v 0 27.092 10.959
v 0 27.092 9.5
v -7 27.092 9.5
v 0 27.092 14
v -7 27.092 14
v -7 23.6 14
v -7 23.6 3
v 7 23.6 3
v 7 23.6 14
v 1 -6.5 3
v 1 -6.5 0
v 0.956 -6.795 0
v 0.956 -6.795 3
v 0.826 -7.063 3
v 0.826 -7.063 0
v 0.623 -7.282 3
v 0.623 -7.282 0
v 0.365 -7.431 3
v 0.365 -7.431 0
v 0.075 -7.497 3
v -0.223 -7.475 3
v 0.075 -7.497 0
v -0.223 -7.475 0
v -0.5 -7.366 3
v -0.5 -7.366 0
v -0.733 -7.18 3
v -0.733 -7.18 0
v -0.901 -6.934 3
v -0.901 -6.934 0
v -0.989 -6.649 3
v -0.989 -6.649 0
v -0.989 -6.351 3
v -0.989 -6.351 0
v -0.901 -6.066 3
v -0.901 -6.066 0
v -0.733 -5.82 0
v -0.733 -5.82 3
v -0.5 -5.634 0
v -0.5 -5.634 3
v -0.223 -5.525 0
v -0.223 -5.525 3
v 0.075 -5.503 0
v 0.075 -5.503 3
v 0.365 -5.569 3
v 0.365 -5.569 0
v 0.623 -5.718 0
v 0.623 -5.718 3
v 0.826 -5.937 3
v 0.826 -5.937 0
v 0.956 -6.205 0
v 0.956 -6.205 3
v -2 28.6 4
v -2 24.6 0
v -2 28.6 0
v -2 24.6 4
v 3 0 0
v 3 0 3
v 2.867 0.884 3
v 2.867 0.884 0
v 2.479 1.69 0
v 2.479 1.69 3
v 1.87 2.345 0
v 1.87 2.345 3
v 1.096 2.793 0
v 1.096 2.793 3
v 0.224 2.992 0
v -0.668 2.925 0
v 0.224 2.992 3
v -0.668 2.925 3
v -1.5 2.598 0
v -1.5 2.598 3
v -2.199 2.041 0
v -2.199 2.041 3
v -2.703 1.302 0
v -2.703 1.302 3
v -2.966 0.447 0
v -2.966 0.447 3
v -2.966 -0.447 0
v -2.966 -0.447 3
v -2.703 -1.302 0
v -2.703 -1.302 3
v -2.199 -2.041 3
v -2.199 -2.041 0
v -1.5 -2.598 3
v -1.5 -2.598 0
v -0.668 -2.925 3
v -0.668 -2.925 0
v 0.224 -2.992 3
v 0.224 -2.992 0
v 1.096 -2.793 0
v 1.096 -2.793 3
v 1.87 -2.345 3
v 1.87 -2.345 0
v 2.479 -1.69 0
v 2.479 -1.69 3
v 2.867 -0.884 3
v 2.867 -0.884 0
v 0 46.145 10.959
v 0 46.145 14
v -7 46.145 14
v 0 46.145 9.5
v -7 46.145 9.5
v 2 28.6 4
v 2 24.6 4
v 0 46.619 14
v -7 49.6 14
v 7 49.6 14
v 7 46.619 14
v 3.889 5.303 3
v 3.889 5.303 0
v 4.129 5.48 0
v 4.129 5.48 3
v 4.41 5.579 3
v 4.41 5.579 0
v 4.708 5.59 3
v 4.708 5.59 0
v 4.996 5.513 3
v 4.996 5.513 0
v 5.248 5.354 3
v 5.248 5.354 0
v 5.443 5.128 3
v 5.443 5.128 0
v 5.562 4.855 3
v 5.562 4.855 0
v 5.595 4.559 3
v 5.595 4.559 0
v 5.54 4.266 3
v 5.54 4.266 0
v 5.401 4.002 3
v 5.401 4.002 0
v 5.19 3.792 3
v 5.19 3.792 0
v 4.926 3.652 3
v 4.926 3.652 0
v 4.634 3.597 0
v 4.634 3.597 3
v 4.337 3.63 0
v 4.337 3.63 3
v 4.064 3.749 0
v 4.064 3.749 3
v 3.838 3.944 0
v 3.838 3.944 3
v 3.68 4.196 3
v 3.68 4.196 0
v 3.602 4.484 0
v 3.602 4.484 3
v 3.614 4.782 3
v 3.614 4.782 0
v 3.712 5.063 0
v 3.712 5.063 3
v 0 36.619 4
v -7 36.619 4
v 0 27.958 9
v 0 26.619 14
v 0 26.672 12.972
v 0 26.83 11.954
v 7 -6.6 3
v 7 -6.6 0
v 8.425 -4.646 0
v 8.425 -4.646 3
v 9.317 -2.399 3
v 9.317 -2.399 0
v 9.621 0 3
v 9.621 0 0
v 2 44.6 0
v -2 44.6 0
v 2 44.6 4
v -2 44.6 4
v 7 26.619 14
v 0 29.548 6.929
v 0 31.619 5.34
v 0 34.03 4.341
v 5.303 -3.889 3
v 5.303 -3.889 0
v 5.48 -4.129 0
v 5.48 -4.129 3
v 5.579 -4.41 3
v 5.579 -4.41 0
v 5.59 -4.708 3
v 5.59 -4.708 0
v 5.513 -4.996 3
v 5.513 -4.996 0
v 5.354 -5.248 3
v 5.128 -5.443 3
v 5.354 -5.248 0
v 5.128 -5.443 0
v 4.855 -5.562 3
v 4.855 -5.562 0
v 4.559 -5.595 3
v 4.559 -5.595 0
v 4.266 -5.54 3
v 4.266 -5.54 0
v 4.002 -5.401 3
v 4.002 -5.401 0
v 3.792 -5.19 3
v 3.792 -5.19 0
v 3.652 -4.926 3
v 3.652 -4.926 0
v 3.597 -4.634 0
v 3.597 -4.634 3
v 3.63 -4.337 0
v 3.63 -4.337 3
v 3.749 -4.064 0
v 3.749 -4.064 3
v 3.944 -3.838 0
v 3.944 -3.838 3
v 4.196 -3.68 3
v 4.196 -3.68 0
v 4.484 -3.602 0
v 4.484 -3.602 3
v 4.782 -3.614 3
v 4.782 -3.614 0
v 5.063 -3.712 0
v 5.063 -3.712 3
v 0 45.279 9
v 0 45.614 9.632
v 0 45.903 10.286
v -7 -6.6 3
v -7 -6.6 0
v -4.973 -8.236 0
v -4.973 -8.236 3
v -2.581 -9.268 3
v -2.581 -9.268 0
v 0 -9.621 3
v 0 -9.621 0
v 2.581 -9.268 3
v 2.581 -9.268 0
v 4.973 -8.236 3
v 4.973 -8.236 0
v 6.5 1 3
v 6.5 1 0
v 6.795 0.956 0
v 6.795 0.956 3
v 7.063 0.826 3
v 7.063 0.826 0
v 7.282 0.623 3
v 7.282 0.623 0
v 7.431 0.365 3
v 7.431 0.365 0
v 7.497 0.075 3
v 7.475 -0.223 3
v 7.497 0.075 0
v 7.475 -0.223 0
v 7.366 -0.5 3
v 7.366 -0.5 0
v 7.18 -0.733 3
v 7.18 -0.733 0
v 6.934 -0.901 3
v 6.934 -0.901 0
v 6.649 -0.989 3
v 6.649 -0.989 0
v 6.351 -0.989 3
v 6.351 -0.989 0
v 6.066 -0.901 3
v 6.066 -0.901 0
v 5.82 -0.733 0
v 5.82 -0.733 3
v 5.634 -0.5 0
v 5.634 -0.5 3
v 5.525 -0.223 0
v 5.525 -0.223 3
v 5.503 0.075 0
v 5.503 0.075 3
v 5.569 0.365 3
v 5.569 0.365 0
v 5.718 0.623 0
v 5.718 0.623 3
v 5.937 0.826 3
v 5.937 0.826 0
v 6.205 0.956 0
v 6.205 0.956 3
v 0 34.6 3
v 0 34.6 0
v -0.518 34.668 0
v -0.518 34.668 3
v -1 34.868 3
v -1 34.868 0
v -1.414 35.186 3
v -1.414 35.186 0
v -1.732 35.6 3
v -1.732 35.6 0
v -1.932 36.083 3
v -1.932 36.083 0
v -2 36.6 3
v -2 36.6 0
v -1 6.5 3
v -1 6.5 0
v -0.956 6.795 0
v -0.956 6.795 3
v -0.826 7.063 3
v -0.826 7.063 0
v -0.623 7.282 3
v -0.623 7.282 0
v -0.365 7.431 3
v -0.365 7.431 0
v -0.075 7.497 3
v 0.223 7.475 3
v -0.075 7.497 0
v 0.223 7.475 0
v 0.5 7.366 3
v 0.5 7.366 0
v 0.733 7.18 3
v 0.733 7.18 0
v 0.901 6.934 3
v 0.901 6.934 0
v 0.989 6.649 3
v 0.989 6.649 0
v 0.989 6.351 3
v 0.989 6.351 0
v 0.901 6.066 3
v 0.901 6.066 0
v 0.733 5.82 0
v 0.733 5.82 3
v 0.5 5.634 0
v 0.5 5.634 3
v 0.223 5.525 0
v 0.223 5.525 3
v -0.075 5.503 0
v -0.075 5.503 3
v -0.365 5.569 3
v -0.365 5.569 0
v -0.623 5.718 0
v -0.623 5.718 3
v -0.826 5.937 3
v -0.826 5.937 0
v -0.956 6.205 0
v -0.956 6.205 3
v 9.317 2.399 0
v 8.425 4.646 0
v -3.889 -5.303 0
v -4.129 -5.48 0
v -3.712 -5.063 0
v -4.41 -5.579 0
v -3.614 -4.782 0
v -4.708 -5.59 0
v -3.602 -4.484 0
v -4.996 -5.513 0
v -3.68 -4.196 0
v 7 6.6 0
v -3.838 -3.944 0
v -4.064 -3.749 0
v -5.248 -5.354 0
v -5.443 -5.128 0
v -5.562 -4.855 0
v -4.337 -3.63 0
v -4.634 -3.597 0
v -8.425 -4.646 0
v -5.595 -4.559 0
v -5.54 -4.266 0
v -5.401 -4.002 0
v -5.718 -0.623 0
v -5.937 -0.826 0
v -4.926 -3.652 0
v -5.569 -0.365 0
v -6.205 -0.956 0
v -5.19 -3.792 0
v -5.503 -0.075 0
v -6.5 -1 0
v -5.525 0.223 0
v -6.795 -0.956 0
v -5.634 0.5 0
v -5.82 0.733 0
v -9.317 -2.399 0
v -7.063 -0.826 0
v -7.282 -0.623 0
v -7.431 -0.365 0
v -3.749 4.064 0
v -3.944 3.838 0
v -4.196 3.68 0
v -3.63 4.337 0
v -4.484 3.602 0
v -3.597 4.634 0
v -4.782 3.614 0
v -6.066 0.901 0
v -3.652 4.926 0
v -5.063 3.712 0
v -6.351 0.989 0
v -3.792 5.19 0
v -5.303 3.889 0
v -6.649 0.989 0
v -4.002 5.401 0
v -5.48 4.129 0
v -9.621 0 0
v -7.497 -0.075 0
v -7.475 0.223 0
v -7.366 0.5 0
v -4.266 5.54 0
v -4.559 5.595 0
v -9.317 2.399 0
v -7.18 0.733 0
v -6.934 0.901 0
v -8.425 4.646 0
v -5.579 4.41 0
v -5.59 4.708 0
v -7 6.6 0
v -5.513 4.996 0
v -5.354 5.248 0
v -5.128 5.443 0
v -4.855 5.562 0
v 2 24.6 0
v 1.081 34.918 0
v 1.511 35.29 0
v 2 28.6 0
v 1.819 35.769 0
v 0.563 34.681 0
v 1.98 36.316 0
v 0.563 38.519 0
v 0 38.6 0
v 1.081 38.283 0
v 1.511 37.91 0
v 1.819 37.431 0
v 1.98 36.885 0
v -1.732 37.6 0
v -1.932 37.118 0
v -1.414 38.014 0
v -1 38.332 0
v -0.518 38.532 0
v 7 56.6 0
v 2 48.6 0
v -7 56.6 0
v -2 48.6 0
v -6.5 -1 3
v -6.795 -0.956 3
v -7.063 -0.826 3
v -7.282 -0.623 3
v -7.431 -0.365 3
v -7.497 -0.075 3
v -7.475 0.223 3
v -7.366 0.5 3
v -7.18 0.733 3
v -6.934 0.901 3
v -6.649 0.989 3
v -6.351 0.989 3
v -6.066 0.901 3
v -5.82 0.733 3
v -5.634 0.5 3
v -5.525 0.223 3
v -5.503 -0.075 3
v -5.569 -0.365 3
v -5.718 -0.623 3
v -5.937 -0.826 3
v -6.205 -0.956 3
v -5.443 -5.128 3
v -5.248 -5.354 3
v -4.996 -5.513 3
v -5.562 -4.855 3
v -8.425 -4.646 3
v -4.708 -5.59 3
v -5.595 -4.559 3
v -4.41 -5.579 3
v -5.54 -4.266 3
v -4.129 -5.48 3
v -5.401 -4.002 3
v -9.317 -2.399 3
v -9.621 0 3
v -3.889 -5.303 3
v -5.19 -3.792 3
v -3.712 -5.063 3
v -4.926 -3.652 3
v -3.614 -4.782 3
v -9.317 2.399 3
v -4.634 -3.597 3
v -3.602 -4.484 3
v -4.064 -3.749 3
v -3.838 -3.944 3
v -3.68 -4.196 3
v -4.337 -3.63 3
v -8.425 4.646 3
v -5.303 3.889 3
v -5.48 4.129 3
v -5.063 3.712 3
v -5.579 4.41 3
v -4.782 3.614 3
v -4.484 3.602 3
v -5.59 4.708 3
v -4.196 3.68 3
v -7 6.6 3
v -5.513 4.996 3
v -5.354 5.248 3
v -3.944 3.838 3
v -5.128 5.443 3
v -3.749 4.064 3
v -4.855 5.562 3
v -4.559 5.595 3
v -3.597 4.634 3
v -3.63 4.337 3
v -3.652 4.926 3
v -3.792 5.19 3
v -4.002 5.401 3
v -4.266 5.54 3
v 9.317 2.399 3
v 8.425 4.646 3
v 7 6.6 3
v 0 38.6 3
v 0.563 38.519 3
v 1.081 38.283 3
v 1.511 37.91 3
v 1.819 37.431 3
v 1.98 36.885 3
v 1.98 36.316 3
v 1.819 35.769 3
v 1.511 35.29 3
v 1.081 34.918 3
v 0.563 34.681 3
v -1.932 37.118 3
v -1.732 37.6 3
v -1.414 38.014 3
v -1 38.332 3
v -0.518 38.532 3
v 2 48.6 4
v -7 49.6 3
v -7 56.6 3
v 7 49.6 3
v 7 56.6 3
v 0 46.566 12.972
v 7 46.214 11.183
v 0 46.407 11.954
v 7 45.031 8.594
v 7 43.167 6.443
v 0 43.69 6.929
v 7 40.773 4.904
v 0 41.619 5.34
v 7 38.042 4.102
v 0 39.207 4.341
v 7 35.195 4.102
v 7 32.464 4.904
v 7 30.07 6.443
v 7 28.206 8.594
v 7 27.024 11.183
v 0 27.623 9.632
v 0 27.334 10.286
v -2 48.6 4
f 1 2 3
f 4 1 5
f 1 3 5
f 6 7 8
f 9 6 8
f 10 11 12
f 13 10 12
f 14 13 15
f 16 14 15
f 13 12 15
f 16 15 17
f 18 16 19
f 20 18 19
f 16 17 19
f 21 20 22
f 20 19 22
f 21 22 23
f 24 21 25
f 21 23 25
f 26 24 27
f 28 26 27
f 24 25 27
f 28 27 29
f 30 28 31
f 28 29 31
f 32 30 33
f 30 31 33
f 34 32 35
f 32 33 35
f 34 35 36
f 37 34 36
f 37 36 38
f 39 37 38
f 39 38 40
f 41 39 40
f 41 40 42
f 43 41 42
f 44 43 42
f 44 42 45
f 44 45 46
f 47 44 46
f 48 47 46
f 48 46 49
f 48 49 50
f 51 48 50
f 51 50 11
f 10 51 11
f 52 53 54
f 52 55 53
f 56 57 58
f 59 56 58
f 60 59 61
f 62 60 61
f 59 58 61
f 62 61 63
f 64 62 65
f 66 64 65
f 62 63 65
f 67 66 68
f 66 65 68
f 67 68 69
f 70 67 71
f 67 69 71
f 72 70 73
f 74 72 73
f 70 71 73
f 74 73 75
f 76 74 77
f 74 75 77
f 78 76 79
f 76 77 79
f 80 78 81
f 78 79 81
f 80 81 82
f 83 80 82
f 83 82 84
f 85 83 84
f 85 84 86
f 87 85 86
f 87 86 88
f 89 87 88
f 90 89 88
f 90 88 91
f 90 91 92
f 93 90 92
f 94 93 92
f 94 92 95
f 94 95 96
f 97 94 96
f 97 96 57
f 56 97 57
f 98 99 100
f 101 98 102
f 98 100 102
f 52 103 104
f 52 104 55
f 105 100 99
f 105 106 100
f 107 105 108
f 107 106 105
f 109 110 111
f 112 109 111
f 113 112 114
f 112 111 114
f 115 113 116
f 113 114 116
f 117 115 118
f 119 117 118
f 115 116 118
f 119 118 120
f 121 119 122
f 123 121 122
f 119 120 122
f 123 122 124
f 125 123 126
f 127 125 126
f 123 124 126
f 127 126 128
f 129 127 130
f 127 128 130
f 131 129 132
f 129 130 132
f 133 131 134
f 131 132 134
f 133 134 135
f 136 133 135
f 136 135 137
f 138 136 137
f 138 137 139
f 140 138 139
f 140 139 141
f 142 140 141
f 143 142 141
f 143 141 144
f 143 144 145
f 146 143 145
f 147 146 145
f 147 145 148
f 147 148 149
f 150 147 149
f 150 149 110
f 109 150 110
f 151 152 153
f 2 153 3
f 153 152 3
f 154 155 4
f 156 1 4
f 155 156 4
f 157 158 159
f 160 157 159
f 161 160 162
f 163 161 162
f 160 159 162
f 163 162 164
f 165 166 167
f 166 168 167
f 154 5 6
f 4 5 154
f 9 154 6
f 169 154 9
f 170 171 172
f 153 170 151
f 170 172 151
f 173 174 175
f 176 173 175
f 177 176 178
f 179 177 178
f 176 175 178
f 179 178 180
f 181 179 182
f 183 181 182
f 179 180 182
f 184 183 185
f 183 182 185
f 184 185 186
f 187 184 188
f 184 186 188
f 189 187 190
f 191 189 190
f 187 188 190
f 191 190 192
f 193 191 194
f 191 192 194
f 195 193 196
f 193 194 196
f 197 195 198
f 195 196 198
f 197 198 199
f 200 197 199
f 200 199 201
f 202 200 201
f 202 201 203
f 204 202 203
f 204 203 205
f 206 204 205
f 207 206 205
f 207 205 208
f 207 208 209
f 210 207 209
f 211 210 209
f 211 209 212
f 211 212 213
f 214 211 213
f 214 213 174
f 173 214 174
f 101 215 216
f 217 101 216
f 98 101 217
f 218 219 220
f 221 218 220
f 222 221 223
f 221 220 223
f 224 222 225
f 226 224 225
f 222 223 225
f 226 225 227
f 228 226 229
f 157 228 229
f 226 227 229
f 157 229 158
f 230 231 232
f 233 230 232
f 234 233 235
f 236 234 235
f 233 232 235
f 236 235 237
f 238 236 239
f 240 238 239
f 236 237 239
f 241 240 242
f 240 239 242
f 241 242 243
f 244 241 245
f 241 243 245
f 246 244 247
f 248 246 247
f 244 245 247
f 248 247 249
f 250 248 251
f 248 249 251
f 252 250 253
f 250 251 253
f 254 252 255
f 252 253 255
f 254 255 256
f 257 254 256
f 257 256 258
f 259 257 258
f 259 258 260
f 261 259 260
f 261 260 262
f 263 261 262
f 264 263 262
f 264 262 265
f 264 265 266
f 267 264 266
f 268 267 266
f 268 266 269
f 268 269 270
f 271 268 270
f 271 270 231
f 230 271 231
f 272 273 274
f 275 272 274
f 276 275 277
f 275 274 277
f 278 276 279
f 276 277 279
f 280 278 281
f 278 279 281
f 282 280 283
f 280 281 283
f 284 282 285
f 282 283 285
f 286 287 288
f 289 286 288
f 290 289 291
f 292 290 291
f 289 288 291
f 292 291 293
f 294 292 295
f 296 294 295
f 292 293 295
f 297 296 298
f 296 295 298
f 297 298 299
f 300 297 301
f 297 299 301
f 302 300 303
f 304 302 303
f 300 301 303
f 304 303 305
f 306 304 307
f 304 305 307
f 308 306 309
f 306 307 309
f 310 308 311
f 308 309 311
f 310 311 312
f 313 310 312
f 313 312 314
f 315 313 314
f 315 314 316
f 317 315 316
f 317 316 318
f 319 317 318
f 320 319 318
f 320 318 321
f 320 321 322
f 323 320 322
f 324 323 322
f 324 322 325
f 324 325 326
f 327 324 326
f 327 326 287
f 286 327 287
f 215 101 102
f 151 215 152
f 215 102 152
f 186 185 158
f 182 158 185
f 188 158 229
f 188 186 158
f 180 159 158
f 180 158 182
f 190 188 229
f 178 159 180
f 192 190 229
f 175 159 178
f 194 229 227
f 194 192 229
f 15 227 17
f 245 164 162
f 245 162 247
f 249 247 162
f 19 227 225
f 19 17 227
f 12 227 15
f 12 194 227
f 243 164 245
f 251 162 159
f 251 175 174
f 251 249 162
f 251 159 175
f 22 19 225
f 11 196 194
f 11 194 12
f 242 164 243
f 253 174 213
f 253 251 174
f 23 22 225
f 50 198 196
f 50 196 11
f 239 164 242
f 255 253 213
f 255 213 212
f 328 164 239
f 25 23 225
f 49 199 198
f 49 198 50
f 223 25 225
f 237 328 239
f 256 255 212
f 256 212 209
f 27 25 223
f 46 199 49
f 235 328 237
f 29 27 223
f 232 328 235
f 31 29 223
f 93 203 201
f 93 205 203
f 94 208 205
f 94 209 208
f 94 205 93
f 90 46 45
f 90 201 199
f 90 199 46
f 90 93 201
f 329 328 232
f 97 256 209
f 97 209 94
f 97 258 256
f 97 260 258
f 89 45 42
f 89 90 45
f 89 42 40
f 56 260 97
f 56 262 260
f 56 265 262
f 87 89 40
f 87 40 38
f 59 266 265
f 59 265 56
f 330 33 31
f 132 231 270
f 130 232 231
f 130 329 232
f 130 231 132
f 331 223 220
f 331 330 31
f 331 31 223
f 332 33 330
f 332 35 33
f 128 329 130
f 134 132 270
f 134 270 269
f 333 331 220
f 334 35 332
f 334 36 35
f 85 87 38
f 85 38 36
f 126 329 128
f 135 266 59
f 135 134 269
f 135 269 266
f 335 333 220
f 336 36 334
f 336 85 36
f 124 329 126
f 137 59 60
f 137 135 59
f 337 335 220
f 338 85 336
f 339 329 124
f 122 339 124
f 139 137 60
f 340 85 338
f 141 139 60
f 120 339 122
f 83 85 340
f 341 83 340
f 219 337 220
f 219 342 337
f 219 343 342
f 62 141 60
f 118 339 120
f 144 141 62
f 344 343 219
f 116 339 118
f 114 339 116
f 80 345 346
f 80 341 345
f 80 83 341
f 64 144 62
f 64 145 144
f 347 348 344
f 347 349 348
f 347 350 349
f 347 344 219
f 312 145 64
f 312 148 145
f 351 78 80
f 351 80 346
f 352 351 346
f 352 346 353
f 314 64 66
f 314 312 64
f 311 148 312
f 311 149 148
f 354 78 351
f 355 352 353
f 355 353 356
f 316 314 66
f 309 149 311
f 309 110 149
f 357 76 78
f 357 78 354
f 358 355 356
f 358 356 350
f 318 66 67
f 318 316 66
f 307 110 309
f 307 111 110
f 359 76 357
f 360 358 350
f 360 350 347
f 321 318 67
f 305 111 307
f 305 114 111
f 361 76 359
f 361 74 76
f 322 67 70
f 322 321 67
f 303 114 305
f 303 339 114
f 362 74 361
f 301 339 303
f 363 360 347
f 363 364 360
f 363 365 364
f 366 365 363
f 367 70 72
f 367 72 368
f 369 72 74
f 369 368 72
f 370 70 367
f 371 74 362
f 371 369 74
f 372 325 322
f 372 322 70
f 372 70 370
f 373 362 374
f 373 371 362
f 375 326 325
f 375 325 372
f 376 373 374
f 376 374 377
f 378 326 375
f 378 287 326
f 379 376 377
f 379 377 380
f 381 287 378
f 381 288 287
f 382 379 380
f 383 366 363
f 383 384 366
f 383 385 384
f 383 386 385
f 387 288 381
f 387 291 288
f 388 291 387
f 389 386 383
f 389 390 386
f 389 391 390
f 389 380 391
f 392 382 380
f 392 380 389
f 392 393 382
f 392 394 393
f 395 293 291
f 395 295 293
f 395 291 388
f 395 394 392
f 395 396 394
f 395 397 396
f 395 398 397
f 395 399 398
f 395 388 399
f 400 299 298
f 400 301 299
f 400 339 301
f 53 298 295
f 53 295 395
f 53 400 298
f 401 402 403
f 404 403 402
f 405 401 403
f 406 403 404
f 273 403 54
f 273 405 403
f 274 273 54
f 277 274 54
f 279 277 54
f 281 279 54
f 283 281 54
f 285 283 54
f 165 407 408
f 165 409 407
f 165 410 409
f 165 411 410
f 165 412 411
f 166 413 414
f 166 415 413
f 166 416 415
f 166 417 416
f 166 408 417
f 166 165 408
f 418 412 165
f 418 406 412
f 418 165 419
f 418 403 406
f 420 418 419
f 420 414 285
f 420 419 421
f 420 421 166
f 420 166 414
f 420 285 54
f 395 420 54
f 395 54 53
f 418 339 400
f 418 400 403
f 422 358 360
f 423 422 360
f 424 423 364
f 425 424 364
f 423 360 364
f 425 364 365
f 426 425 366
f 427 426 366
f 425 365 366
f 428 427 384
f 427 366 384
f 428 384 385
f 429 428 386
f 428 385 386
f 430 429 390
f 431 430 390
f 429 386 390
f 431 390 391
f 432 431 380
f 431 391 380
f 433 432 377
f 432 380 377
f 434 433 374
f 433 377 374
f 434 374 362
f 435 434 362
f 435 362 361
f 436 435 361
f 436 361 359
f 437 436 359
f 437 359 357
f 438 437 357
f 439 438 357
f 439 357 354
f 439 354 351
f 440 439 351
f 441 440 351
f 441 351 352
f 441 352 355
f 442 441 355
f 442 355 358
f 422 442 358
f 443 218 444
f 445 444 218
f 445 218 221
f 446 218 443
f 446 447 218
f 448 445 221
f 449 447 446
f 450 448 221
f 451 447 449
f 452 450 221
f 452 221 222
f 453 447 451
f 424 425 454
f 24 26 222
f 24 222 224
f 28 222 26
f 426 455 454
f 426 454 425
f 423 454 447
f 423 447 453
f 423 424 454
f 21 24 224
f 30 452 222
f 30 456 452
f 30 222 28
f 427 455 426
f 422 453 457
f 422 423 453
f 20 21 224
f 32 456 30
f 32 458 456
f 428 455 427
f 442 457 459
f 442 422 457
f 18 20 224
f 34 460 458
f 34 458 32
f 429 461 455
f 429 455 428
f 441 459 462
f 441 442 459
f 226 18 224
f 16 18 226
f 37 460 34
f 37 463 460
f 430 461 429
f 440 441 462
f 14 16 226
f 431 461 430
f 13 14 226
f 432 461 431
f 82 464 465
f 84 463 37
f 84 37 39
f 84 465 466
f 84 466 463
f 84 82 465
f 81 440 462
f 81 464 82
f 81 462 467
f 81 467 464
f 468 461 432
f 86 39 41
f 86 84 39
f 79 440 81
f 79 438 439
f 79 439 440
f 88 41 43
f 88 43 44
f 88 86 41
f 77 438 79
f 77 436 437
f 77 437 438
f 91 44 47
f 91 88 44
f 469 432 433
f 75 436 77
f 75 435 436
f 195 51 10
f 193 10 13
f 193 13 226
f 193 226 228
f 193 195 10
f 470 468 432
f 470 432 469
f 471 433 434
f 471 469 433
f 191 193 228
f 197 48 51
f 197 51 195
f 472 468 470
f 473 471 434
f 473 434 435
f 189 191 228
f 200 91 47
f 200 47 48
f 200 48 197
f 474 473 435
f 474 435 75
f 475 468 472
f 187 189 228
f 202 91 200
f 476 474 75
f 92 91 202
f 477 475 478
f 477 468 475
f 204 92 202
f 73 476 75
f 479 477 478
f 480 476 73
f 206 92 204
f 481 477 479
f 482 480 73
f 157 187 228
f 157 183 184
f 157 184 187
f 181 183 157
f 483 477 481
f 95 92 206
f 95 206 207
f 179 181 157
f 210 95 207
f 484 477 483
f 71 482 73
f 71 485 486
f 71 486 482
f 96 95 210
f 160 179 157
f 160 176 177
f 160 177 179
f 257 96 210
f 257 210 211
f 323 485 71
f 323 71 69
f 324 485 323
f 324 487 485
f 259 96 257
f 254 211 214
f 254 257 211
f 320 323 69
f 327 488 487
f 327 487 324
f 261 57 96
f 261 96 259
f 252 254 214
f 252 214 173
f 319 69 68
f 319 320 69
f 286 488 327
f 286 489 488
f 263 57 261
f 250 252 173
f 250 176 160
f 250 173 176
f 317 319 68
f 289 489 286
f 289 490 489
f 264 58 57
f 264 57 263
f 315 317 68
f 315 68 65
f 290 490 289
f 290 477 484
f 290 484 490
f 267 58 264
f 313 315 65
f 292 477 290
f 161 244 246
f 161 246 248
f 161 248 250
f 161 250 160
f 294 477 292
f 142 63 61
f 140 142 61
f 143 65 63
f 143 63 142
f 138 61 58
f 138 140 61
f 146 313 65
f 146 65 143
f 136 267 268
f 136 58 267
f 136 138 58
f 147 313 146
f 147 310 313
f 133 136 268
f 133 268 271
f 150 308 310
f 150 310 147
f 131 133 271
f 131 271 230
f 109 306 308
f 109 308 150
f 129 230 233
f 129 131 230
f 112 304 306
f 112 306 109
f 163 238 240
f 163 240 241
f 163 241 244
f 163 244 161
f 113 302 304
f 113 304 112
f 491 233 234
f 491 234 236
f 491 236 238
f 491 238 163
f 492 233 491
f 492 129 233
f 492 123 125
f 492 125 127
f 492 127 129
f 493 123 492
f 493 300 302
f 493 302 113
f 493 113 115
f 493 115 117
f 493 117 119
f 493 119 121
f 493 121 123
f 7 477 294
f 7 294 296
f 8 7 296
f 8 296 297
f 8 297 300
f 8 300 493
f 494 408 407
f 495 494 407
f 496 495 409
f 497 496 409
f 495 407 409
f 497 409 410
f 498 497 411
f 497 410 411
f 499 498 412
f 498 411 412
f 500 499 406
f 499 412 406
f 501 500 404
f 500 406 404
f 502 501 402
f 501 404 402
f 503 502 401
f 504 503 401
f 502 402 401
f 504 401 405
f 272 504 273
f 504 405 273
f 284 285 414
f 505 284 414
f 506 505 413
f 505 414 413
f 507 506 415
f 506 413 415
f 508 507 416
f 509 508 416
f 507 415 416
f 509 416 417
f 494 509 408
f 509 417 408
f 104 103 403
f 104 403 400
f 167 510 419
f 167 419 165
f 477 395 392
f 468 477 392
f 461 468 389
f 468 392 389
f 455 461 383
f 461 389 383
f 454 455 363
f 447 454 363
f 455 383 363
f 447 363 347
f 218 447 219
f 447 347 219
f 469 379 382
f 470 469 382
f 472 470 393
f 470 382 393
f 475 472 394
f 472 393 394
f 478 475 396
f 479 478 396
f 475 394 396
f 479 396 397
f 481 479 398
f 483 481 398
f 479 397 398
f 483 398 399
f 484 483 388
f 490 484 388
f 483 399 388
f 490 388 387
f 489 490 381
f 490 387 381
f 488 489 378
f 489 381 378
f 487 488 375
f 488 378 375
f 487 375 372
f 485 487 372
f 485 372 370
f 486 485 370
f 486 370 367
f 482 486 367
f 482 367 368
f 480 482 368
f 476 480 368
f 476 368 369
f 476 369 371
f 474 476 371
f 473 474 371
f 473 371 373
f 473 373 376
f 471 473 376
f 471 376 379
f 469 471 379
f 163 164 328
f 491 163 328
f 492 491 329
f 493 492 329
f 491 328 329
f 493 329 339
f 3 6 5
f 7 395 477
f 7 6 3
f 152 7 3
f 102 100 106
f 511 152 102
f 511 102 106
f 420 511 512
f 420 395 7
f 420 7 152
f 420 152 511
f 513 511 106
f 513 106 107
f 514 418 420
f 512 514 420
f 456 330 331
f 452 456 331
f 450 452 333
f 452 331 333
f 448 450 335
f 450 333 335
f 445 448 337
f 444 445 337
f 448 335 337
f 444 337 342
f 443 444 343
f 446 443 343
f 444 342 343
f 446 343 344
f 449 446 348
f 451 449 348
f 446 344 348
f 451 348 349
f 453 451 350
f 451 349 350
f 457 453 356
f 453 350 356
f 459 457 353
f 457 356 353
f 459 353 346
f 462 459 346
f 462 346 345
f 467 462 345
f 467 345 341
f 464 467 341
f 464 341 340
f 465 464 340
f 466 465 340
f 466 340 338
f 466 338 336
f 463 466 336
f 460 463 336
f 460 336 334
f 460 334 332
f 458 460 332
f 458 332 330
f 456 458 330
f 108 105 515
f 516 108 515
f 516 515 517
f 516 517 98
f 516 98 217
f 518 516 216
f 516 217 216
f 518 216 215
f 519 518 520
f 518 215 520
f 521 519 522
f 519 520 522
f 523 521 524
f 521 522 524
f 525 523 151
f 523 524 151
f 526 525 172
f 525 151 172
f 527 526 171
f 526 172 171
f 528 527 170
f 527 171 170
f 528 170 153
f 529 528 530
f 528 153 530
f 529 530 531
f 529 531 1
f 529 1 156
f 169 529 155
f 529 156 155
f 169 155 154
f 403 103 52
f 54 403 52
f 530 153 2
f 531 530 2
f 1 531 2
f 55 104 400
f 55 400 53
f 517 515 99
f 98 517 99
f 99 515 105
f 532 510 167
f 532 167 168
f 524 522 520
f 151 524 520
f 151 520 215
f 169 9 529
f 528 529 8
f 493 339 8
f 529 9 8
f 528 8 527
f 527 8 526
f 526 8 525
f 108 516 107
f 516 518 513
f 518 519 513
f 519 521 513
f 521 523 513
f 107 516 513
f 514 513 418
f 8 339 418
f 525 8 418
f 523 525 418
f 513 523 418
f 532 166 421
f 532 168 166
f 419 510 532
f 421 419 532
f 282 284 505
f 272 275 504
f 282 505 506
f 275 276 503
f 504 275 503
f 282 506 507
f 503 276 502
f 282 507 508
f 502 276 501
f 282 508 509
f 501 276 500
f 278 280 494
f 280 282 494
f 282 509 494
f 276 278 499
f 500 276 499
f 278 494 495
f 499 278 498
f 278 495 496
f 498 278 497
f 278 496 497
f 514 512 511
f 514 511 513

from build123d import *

# Parameters (mm, degrees)
SKETCH_1_W               = 14
SKETCH_1_H               = 13.200286042
EXTRUDE_1_DEPTH          = 3
SKETCH_3_OUTSIDE_W       = 35.048
SKETCH_3_OUTSIDE_H       = 82.027
CUT_EXTRUDE_2_DEPTH      = 3
SKETCH_4_R               = 3
CUT_EXTRUDE_3_DEPTH      = 10
SKETCH_5_R               = 1
CUT_EXTRUDE_4_DEPTH      = 10
SKETCH_6_W               = 4
SKETCH_6_H               = 4
EXTRUDE_3_DEPTH          = 3
CUT_EXTRUDE_5_DEPTH      = 10
PATTERN_CIRCULAR_1_COUNT = 8
SKETCH_9_W               = 14
SKETCH_9_H               = 26
EXTRUDE_4_DEPTH          = 11
CUT_EXTRUDE_8_DEPTH      = 7
SKETCH_11_R              = 10
CUT_EXTRUDE_9_DEPTH      = 7
SKETCH_12_W              = 4
SKETCH_12_H              = 4
CUT_EXTRUDE_10_DEPTH     = 1


with BuildPart() as part:
    # 草图1 → 凸台-拉伸1 (new body)
    with BuildSketch(Plane.XY):
        Rectangle(SKETCH_1_W, SKETCH_1_H)
        with BuildLine():
            ThreePointArc((-7, 6.600143021), (-9.620908892, 0), (-7, -6.600143021))
            Line((-7, -6.600143021), (-7, 6.600143021))
        make_face()
        with BuildLine():
            Line((7, -6.600143021), (-7, -6.600143021))
            ThreePointArc((-7, -6.600143021), (0, -9.620908892), (7, -6.600143021))
        make_face()
        with BuildLine():
            Line((7, 6.600143021), (7, -6.600143021))
            ThreePointArc((7, -6.600143021), (8.941707056, -3.550741166), (9.620908892, 0))
            ThreePointArc((9.620908892, 0), (8.941707056, 3.550741166), (7, 6.600143021))
        make_face()
        with BuildLine():
            ThreePointArc((7, 6.600143021), (0, 9.620908892), (-7, 6.600143021))
            Line((-7, 6.600143021), (7, 6.600143021))
        make_face()
        with BuildLine():
            Line((-7, 56.600143021), (-7, 6.600143021))
            ThreePointArc((-7, 6.600143021), (0, 9.620908892), (7, 6.600143021))
            Line((7, 6.600143021), (7, 56.600143021))
            Line((7, 56.600143021), (-7, 56.600143021))
        make_face()
    extrude(amount=EXTRUDE_1_DEPTH)

    # 草图3 outside → 切除-拉伸2 (cut)
    with BuildSketch(Plane.XY.offset(3)):
        with Locations((0, 23.4895)):
            Rectangle(SKETCH_3_OUTSIDE_W, SKETCH_3_OUTSIDE_H)
        with BuildLine():
            Line((7, 56.600143021), (0, 56.600143021))
            Line((0, 56.600143021), (-7, 56.600143021))
            Line((-7, 56.600143021), (-7, 6.600143021))
            ThreePointArc((-7, 6.600143021), (0, -9.620908892), (7, 6.600143021))
            Line((7, 6.600143021), (7, 56.600143021))
        make_face(mode=Mode.SUBTRACT)
        Polygon((-2, 28.600143021), (0, 28.600143021), (2, 28.600143021), (2, 24.600143021), (-2, 24.600143021), align=None)
        Polygon((-2, 38.600143021), (0, 38.600143021), (2, 38.600143021), (2, 34.600143021), (0, 34.600143021), (-2, 34.600143021), align=None)
        Polygon((-2, 48.600143021), (0, 48.600143021), (2, 48.600143021), (2, 44.600143021), (0, 44.600143021), (-2, 44.600143021), align=None)
    extrude(amount=-CUT_EXTRUDE_2_DEPTH, mode=Mode.SUBTRACT)

    # 草图4 → 切除-拉伸3 (cut)
    with BuildSketch(Plane.XY.offset(3)):
        Circle(SKETCH_4_R)
    extrude(amount=-CUT_EXTRUDE_3_DEPTH, mode=Mode.SUBTRACT)

    # 草图5 → 切除-拉伸4 (cut)
    with BuildSketch(Plane(origin=(0, 0, 0), x_dir=(-1, 0, 0), z_dir=(0, 0, -1))):
        with Locations((0, 6.5)):
            Circle(SKETCH_5_R)
    cut_extrude_4 = extrude(amount=-CUT_EXTRUDE_4_DEPTH, mode=Mode.SUBTRACT)

    # 草图6 → 凸台-拉伸3 (add)
    with BuildSketch(Plane(origin=(0, 0, 0), x_dir=(-1, 0, 0), z_dir=(0, 0, -1))):
        with Locations((0, 36.600143021)):
            Rectangle(SKETCH_6_W, SKETCH_6_H)
    extrude(amount=-EXTRUDE_3_DEPTH)

    # 草图7 → 切除-拉伸5 (cut)
    with BuildSketch(Plane(origin=(0, 0, 0), x_dir=(-1, 0, 0), z_dir=(0, 0, -1))):
        with BuildLine():
            ThreePointArc((0, 38.600143021), (-2, 36.600143021), (0, 34.600143021))
            Line((0, 34.600143021), (0, 38.600143021))
        make_face()
        with BuildLine():
            Line((0, 38.600143021), (0, 34.600143021))
            ThreePointArc((0, 34.600143021), (1.414213562, 35.185929459), (2, 36.600143021))
            ThreePointArc((2, 36.600143021), (1.414213562, 38.014356584), (0, 38.600143021))
        make_face()
    extrude(amount=-CUT_EXTRUDE_5_DEPTH, mode=Mode.SUBTRACT)

    # 阵列(圆周)1: 切除-拉伸4 ×8 about axis
    pattern_circular_1_axis = Axis((0, 0, 0), (0, 0, 1))
    for i in range(1, PATTERN_CIRCULAR_1_COUNT):
        add(cut_extrude_4.rotate(pattern_circular_1_axis, i * 360 / PATTERN_CIRCULAR_1_COUNT), mode=Mode.SUBTRACT)

    # 草图9 → 凸台-拉伸4 (add)
    with BuildSketch(Plane.XY.offset(3)):
        with Locations((0, 36.600143021)):
            Rectangle(SKETCH_9_W, SKETCH_9_H)
    extrude(amount=EXTRUDE_4_DEPTH)

    # 草图10 → 切除-拉伸8 (cut)
    with BuildSketch(Plane.ZY.offset(7)):
        Polygon((4, 36.618598328), (9.5, 27.092318886), (14, 27.092318886), (14, 46.14487777), (9.5, 46.14487777), align=None)
    extrude(amount=-CUT_EXTRUDE_8_DEPTH, mode=Mode.SUBTRACT)

    # 草图11 → 切除-拉伸9 (cut)
    with BuildSketch(Plane.ZY):
        with Locations((14, 36.618598328)):
            Circle(SKETCH_11_R)
    extrude(amount=-CUT_EXTRUDE_9_DEPTH, mode=Mode.SUBTRACT)

    # 草图12 → 切除-拉伸10 (cut)
    with BuildSketch(Plane(origin=(0, 0, 3), x_dir=(-1, 0, 0), z_dir=(0, 0, -1))):
        with Locations((0, 46.600143021)):
            Rectangle(SKETCH_12_W, SKETCH_12_H)
        with Locations((0, 26.600143021)):
            Rectangle(SKETCH_12_W, SKETCH_12_H)
    extrude(amount=-CUT_EXTRUDE_10_DEPTH, mode=Mode.SUBTRACT)


solid = part.part
